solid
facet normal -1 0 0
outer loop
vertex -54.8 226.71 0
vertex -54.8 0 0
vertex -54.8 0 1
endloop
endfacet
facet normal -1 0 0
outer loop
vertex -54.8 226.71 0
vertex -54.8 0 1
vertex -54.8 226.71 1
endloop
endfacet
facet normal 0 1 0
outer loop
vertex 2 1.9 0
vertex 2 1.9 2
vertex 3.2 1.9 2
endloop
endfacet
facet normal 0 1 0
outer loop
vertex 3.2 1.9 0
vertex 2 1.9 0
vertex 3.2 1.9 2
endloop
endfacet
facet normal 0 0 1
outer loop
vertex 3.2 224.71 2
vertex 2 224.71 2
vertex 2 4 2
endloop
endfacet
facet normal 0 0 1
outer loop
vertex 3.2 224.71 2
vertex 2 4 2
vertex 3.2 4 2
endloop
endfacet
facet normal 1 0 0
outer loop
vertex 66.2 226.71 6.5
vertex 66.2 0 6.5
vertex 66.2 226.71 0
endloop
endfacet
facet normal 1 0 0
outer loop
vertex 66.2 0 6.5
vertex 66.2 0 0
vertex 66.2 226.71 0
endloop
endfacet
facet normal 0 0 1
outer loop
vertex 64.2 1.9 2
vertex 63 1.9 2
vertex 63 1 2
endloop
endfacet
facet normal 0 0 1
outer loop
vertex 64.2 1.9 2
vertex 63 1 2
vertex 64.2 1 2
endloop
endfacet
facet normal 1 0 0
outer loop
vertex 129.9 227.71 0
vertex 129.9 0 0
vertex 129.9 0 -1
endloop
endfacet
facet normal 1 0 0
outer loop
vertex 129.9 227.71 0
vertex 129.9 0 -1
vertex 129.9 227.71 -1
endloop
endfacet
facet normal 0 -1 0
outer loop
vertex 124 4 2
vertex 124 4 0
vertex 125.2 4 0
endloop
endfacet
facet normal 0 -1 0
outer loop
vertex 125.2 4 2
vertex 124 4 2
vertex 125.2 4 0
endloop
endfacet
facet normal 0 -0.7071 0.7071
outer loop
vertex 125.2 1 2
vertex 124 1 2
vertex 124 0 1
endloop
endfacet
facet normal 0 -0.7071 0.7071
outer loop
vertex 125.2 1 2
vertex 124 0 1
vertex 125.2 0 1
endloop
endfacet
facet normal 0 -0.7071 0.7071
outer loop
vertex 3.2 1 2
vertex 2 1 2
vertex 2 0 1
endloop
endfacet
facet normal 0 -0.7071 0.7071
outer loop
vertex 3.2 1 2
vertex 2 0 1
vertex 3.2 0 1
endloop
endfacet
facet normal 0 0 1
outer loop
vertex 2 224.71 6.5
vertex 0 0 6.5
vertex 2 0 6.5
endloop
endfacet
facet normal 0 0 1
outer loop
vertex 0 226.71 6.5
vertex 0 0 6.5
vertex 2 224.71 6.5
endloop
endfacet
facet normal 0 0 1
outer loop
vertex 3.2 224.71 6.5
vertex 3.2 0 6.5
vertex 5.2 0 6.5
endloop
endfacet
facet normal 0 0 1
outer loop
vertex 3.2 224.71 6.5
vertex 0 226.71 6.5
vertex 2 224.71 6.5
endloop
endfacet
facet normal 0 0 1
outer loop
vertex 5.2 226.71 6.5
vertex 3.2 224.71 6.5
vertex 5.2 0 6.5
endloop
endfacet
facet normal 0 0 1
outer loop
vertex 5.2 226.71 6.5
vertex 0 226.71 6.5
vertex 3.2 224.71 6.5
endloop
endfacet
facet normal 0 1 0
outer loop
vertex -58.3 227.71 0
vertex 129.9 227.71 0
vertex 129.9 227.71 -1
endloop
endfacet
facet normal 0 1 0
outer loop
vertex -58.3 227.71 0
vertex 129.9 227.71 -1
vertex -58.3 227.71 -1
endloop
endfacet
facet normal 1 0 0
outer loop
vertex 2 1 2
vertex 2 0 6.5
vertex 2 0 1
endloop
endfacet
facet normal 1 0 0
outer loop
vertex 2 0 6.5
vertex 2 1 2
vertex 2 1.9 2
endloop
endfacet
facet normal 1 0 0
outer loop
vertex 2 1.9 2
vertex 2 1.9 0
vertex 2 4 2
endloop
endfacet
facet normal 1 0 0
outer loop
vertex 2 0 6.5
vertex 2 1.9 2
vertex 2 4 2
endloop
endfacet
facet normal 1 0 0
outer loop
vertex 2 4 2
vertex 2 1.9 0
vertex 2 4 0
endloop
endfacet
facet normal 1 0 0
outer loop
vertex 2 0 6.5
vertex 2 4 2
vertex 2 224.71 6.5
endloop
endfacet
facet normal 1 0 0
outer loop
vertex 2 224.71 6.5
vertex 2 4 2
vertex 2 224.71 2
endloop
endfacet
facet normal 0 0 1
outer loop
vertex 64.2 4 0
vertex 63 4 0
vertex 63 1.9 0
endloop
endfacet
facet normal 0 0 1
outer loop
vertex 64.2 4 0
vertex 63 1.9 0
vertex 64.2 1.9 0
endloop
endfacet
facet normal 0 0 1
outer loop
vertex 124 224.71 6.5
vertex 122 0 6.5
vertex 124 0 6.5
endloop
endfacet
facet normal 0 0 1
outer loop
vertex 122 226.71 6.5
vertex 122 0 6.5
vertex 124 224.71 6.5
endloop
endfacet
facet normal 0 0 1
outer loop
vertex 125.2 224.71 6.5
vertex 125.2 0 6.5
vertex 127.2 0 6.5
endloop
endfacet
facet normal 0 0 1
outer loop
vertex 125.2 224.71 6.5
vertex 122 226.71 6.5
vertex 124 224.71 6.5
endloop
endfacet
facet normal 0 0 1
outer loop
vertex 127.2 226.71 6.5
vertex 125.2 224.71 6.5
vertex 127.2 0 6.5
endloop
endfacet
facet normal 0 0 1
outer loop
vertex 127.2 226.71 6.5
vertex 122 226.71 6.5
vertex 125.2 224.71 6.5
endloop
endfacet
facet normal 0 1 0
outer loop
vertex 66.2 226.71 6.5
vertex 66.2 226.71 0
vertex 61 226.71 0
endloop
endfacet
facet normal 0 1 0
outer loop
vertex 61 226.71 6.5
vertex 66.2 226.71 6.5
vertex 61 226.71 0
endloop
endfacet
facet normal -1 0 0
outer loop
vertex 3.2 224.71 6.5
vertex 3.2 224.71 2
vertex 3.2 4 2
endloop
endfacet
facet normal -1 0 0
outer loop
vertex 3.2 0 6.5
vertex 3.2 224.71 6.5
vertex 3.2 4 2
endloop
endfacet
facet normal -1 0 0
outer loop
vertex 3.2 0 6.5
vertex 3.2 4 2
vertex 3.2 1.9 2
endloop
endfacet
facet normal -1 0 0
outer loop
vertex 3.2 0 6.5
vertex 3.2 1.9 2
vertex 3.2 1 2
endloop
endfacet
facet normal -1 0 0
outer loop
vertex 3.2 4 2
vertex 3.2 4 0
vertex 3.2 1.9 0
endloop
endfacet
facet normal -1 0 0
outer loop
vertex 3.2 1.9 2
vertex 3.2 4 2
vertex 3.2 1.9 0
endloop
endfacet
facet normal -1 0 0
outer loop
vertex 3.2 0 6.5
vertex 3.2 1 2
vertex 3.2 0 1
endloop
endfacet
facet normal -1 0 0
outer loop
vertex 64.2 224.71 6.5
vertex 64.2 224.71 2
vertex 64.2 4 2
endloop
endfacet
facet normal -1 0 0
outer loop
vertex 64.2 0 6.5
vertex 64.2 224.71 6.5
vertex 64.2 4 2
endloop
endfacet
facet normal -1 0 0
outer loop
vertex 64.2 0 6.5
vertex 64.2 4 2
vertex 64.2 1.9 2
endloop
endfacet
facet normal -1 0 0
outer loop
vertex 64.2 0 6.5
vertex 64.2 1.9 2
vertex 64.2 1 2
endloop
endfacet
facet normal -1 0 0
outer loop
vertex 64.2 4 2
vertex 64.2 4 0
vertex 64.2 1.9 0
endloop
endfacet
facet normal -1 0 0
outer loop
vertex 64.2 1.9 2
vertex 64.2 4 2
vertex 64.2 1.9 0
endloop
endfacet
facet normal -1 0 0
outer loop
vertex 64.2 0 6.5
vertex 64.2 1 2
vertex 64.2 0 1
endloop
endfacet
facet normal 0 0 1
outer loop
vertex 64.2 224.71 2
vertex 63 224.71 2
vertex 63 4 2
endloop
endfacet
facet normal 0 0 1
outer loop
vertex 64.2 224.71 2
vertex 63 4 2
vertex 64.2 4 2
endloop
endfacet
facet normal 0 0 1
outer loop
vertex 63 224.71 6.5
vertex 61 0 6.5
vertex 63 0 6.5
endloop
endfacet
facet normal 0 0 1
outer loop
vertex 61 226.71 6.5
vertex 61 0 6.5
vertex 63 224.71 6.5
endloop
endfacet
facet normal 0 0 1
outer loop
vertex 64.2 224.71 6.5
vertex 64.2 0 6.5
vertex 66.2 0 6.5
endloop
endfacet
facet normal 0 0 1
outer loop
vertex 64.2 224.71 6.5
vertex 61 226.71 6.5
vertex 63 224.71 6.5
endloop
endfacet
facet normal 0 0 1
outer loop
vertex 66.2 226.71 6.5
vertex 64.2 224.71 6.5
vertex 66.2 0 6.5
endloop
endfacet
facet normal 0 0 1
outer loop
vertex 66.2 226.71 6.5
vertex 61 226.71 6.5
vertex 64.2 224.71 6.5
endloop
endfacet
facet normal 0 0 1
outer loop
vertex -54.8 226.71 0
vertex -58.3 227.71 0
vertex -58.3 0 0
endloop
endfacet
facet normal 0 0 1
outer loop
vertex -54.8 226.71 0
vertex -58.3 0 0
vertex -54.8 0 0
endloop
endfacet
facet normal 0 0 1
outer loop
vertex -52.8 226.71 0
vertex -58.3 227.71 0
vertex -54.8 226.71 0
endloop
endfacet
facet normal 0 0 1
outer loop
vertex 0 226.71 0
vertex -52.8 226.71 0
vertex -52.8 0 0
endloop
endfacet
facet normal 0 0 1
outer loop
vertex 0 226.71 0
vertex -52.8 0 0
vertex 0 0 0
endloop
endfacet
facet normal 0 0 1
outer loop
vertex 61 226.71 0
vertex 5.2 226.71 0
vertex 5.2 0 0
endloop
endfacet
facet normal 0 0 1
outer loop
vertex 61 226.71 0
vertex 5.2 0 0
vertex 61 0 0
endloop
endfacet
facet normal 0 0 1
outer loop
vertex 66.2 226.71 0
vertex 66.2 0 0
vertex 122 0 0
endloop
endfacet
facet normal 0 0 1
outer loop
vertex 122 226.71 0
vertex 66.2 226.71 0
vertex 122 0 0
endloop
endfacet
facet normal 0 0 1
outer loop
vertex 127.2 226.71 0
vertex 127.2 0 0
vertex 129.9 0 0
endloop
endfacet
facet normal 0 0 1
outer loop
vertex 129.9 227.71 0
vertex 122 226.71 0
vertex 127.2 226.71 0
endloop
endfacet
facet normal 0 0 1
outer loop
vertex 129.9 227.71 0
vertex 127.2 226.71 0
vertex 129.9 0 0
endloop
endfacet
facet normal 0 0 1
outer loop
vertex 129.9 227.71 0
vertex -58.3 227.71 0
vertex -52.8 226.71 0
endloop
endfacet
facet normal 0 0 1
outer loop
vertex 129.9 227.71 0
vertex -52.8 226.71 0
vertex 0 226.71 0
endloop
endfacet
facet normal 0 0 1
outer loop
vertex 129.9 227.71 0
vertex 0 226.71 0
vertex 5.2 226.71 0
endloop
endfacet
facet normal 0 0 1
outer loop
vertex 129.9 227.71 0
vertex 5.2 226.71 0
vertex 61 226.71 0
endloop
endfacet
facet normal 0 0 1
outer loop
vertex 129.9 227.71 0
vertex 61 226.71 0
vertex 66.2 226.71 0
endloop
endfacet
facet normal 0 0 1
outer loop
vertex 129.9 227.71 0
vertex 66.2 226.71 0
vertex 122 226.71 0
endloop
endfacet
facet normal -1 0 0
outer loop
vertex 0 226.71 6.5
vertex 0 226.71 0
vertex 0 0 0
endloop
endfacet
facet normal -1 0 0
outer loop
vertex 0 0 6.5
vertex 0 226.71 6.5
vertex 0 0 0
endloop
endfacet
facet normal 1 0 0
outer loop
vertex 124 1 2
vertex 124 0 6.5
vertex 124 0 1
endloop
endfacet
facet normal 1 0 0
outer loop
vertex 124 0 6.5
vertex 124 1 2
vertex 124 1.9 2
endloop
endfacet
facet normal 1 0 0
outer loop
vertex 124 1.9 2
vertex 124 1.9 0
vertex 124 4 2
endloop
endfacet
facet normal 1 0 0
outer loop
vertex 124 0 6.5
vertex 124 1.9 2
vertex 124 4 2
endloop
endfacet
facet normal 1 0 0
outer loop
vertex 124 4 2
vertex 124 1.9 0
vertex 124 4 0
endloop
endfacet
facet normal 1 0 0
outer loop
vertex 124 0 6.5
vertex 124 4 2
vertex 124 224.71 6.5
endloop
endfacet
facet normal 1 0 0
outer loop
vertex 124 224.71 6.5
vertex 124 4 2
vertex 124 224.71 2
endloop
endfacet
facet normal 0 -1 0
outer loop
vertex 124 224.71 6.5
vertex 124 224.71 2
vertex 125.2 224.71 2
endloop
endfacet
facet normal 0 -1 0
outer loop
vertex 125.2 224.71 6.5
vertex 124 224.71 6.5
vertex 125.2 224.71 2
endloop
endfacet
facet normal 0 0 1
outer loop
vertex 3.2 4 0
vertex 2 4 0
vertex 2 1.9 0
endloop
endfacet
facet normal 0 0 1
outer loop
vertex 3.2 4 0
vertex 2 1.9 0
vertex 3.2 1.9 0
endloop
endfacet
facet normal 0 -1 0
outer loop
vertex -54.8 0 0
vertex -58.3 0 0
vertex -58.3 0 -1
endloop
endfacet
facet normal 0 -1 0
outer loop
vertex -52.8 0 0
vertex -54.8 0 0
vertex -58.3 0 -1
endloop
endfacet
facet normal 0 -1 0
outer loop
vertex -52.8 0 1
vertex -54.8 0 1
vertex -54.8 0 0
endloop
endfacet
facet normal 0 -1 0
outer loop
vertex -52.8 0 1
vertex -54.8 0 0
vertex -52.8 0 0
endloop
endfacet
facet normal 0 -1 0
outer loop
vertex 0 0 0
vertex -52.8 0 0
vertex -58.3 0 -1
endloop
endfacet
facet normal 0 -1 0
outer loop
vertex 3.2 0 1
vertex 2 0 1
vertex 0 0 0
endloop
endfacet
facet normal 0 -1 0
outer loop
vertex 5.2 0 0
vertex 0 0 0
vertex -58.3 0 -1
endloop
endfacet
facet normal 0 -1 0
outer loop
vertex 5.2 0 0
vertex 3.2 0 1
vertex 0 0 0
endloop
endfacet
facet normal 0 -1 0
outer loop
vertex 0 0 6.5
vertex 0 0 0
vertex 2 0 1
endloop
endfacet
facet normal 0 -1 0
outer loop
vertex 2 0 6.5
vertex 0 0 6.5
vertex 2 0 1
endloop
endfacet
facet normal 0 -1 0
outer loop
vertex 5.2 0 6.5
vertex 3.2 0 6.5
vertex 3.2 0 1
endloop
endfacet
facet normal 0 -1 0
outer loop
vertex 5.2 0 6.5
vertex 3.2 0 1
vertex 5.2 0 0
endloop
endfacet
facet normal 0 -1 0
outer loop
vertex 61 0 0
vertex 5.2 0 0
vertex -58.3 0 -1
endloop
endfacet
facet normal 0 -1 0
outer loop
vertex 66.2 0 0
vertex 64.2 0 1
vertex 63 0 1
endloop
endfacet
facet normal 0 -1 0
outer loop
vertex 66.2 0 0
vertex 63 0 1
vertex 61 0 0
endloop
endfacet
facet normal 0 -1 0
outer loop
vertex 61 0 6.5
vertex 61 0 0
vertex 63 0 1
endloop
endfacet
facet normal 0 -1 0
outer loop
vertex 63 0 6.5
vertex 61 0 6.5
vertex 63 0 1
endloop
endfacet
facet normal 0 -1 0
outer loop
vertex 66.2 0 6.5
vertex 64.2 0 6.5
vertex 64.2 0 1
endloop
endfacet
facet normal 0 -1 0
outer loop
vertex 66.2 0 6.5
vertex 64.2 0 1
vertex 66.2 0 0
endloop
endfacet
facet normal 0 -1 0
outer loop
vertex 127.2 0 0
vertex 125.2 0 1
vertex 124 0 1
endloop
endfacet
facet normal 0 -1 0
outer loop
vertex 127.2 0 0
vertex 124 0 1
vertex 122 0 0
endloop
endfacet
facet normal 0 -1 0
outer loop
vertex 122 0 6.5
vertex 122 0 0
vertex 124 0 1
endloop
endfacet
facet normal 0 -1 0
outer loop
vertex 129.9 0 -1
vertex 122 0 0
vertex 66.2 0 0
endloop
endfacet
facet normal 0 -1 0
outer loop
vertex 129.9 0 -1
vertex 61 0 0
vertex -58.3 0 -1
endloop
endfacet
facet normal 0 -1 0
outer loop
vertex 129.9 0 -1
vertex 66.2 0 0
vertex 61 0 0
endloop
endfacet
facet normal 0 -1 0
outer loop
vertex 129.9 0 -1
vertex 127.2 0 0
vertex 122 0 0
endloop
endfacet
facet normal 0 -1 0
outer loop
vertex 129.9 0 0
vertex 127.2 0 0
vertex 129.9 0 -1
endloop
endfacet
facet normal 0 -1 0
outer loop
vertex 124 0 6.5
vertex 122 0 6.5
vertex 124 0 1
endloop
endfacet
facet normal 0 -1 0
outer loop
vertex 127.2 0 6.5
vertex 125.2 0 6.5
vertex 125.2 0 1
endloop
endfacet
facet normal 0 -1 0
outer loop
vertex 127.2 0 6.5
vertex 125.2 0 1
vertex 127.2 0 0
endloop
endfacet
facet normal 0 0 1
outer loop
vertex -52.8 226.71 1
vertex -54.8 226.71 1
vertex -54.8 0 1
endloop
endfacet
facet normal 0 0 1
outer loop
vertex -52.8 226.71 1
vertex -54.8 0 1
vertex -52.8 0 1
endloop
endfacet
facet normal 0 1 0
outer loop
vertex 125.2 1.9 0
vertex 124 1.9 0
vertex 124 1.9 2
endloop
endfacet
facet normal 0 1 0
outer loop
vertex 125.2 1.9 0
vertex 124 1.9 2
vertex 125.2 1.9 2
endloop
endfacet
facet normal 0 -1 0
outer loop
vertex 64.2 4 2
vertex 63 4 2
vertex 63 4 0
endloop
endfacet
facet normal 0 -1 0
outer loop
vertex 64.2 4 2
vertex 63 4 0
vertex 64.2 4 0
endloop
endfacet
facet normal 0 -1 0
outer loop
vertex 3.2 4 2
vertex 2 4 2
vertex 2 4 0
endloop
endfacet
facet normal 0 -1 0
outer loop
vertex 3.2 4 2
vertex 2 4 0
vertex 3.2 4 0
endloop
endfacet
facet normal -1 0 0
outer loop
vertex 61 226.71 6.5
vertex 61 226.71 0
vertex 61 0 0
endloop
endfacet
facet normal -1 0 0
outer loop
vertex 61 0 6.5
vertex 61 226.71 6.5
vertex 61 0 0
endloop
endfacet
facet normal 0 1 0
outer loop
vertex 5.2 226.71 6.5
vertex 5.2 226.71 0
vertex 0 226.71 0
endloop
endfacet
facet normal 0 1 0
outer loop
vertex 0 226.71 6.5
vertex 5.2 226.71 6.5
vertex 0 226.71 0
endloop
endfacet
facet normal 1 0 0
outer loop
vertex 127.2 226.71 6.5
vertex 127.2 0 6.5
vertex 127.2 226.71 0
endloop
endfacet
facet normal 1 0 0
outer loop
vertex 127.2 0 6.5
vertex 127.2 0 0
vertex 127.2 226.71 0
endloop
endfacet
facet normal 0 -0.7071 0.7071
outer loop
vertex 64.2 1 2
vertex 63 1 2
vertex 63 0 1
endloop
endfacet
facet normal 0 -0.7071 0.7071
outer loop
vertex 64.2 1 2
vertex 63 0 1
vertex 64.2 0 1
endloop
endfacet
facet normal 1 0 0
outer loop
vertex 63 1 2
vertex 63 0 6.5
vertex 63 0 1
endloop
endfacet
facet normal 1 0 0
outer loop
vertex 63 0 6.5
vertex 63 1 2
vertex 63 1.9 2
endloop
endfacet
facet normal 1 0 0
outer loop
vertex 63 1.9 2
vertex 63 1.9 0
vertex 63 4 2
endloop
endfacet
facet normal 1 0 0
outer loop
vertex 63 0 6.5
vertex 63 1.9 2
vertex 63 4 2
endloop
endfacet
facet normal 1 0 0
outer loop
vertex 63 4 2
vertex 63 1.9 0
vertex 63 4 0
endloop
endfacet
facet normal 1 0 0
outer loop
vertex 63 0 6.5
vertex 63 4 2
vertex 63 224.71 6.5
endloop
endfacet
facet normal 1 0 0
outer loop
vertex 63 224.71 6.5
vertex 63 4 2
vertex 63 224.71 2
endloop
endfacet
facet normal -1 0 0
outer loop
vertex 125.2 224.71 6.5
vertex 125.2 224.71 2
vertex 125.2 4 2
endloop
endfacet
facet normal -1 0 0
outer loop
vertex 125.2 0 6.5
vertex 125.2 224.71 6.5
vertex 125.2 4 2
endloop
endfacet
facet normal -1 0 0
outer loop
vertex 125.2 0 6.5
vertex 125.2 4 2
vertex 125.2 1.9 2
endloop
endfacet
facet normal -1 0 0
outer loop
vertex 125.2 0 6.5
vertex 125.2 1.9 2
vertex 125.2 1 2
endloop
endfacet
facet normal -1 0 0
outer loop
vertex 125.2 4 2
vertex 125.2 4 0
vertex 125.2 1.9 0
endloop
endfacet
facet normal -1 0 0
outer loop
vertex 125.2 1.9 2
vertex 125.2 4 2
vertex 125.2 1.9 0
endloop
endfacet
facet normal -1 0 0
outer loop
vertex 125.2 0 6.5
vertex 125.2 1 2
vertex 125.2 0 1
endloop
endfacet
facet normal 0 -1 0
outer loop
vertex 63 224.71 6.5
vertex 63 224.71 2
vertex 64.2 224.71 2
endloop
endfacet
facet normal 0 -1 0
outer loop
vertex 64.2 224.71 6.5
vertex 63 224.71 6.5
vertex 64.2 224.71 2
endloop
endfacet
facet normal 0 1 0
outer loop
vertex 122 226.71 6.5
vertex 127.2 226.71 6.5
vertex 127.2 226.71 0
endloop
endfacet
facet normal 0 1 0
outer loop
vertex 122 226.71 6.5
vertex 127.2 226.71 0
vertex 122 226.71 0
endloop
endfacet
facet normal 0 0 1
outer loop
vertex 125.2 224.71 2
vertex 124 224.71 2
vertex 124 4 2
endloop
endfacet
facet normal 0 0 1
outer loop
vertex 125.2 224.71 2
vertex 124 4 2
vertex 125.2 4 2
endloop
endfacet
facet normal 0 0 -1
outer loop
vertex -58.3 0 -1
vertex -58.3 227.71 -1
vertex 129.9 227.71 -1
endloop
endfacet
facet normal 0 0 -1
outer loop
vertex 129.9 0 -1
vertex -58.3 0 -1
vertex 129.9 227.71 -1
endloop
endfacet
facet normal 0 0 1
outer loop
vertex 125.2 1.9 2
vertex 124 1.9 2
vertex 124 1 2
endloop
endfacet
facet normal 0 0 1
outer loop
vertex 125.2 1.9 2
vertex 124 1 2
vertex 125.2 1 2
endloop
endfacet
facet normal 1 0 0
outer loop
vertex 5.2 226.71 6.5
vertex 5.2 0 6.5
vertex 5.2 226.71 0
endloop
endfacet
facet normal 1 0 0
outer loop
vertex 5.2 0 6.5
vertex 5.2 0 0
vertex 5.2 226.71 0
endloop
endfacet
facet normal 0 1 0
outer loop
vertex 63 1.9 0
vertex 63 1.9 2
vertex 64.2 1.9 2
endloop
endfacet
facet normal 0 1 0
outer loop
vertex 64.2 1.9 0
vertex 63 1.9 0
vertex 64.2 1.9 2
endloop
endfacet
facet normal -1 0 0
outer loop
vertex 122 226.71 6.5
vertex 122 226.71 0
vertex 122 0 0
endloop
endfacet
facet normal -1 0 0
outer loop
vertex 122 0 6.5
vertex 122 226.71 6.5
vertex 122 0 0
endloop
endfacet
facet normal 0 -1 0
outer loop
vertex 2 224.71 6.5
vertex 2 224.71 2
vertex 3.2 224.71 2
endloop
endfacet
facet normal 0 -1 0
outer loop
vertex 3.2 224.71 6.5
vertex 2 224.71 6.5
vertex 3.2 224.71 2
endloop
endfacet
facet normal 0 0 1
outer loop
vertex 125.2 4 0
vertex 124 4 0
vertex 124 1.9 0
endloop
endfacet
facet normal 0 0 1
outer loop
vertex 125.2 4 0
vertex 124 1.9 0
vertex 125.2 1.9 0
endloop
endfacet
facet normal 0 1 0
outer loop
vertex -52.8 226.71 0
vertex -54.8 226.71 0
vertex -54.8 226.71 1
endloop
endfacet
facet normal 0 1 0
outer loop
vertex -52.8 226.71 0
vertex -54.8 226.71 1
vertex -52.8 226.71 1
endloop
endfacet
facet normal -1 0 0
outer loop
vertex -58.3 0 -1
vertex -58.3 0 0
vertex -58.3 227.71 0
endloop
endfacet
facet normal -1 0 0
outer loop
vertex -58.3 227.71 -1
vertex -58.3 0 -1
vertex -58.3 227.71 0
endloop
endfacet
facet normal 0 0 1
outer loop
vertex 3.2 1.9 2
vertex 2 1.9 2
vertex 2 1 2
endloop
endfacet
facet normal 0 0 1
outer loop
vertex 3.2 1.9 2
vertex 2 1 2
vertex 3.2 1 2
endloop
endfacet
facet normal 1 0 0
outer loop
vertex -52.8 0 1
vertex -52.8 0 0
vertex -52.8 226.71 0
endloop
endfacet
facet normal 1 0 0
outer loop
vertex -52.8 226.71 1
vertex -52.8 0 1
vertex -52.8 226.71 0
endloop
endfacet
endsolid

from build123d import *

# Parameters (mm, degrees)
F0_W     = 5.2
F0_H     = 226.71
F1_DEPTH = 2
F3_DEPTH = 4.5
F4_W     = 1.2
F4_H     = 2.1
F5_DEPTH = 25
F6_W     = 185.5
F6_H     = 227.71
F6_W_2   = 2.7
F7_DEPTH = 1
F8_W     = 2
F8_H     = 226.71
F9_DEPTH = 1
F10_SIZE = 1


with BuildPart() as f1:
    # F0 (on Top) → F1 (new body)
    with BuildSketch(Plane.XY):
        with Locations((2.6, 113.355)):
            Rectangle(F0_W, F0_H)
        with Locations((63.6, 113.355)):
            Rectangle(F0_W, F0_H)
        with Locations((124.6, 113.355)):
            Rectangle(F0_W, F0_H)
    extrude(amount=F1_DEPTH)

    # F2 (on face) → F3 (join)
    with BuildSketch(Plane.XY.offset(2)):
        Polygon((0, 226.71), (0, 0), (2, 0), (2, 224.71), (3.2, 224.71), (3.2, 0), (5.2, 0), (5.2, 226.71), align=None)
        Polygon((61, 226.71), (61, 0), (63, 0), (63, 224.71), (64.2, 224.71), (64.2, 0), (66.2, 0), (66.2, 226.71), align=None)
        Polygon((122, 226.71), (122, 0), (124, 0), (124, 224.71), (125.2, 224.71), (125.2, 0), (127.2, 0), (127.2, 226.71), align=None)
    extrude(amount=F3_DEPTH)

    # F4 (on face) → F5 (cut)
    with BuildSketch(Plane.XY.offset(2)):
        with Locations((2.6, 2.95)):
            Rectangle(F4_W, F4_H)
        with Locations((63.6, 2.95)):
            Rectangle(F4_W, F4_H)
        with Locations((124.6, 2.95)):
            Rectangle(F4_W, F4_H)
    extrude(amount=-F5_DEPTH, mode=Mode.SUBTRACT)

    # F6 (on Top) → F7 (join)
    with BuildSketch(Plane.XY):
        with Locations((34.45, 113.855)):
            Rectangle(F6_W, F6_H)
        with Locations((128.55, 113.855)):
            Rectangle(F6_W_2, F6_H)
    extrude(amount=-F7_DEPTH)

    # F8 (on face) → F9 (join)
    with BuildSketch(Plane.XY):
        with Locations((-53.8, 113.355)):
            Rectangle(F8_W, F8_H)
    extrude(amount=F9_DEPTH)

    # F10
    f10_edges = [f1.edges().sort_by_distance(p)[0] for p in [
        (2.6, 0, 2),
        (63.6, 0, 2),
        (124.6, 0, 2),
    ]]
    chamfer(f10_edges, length=F10_SIZE)


solid = f1.part
